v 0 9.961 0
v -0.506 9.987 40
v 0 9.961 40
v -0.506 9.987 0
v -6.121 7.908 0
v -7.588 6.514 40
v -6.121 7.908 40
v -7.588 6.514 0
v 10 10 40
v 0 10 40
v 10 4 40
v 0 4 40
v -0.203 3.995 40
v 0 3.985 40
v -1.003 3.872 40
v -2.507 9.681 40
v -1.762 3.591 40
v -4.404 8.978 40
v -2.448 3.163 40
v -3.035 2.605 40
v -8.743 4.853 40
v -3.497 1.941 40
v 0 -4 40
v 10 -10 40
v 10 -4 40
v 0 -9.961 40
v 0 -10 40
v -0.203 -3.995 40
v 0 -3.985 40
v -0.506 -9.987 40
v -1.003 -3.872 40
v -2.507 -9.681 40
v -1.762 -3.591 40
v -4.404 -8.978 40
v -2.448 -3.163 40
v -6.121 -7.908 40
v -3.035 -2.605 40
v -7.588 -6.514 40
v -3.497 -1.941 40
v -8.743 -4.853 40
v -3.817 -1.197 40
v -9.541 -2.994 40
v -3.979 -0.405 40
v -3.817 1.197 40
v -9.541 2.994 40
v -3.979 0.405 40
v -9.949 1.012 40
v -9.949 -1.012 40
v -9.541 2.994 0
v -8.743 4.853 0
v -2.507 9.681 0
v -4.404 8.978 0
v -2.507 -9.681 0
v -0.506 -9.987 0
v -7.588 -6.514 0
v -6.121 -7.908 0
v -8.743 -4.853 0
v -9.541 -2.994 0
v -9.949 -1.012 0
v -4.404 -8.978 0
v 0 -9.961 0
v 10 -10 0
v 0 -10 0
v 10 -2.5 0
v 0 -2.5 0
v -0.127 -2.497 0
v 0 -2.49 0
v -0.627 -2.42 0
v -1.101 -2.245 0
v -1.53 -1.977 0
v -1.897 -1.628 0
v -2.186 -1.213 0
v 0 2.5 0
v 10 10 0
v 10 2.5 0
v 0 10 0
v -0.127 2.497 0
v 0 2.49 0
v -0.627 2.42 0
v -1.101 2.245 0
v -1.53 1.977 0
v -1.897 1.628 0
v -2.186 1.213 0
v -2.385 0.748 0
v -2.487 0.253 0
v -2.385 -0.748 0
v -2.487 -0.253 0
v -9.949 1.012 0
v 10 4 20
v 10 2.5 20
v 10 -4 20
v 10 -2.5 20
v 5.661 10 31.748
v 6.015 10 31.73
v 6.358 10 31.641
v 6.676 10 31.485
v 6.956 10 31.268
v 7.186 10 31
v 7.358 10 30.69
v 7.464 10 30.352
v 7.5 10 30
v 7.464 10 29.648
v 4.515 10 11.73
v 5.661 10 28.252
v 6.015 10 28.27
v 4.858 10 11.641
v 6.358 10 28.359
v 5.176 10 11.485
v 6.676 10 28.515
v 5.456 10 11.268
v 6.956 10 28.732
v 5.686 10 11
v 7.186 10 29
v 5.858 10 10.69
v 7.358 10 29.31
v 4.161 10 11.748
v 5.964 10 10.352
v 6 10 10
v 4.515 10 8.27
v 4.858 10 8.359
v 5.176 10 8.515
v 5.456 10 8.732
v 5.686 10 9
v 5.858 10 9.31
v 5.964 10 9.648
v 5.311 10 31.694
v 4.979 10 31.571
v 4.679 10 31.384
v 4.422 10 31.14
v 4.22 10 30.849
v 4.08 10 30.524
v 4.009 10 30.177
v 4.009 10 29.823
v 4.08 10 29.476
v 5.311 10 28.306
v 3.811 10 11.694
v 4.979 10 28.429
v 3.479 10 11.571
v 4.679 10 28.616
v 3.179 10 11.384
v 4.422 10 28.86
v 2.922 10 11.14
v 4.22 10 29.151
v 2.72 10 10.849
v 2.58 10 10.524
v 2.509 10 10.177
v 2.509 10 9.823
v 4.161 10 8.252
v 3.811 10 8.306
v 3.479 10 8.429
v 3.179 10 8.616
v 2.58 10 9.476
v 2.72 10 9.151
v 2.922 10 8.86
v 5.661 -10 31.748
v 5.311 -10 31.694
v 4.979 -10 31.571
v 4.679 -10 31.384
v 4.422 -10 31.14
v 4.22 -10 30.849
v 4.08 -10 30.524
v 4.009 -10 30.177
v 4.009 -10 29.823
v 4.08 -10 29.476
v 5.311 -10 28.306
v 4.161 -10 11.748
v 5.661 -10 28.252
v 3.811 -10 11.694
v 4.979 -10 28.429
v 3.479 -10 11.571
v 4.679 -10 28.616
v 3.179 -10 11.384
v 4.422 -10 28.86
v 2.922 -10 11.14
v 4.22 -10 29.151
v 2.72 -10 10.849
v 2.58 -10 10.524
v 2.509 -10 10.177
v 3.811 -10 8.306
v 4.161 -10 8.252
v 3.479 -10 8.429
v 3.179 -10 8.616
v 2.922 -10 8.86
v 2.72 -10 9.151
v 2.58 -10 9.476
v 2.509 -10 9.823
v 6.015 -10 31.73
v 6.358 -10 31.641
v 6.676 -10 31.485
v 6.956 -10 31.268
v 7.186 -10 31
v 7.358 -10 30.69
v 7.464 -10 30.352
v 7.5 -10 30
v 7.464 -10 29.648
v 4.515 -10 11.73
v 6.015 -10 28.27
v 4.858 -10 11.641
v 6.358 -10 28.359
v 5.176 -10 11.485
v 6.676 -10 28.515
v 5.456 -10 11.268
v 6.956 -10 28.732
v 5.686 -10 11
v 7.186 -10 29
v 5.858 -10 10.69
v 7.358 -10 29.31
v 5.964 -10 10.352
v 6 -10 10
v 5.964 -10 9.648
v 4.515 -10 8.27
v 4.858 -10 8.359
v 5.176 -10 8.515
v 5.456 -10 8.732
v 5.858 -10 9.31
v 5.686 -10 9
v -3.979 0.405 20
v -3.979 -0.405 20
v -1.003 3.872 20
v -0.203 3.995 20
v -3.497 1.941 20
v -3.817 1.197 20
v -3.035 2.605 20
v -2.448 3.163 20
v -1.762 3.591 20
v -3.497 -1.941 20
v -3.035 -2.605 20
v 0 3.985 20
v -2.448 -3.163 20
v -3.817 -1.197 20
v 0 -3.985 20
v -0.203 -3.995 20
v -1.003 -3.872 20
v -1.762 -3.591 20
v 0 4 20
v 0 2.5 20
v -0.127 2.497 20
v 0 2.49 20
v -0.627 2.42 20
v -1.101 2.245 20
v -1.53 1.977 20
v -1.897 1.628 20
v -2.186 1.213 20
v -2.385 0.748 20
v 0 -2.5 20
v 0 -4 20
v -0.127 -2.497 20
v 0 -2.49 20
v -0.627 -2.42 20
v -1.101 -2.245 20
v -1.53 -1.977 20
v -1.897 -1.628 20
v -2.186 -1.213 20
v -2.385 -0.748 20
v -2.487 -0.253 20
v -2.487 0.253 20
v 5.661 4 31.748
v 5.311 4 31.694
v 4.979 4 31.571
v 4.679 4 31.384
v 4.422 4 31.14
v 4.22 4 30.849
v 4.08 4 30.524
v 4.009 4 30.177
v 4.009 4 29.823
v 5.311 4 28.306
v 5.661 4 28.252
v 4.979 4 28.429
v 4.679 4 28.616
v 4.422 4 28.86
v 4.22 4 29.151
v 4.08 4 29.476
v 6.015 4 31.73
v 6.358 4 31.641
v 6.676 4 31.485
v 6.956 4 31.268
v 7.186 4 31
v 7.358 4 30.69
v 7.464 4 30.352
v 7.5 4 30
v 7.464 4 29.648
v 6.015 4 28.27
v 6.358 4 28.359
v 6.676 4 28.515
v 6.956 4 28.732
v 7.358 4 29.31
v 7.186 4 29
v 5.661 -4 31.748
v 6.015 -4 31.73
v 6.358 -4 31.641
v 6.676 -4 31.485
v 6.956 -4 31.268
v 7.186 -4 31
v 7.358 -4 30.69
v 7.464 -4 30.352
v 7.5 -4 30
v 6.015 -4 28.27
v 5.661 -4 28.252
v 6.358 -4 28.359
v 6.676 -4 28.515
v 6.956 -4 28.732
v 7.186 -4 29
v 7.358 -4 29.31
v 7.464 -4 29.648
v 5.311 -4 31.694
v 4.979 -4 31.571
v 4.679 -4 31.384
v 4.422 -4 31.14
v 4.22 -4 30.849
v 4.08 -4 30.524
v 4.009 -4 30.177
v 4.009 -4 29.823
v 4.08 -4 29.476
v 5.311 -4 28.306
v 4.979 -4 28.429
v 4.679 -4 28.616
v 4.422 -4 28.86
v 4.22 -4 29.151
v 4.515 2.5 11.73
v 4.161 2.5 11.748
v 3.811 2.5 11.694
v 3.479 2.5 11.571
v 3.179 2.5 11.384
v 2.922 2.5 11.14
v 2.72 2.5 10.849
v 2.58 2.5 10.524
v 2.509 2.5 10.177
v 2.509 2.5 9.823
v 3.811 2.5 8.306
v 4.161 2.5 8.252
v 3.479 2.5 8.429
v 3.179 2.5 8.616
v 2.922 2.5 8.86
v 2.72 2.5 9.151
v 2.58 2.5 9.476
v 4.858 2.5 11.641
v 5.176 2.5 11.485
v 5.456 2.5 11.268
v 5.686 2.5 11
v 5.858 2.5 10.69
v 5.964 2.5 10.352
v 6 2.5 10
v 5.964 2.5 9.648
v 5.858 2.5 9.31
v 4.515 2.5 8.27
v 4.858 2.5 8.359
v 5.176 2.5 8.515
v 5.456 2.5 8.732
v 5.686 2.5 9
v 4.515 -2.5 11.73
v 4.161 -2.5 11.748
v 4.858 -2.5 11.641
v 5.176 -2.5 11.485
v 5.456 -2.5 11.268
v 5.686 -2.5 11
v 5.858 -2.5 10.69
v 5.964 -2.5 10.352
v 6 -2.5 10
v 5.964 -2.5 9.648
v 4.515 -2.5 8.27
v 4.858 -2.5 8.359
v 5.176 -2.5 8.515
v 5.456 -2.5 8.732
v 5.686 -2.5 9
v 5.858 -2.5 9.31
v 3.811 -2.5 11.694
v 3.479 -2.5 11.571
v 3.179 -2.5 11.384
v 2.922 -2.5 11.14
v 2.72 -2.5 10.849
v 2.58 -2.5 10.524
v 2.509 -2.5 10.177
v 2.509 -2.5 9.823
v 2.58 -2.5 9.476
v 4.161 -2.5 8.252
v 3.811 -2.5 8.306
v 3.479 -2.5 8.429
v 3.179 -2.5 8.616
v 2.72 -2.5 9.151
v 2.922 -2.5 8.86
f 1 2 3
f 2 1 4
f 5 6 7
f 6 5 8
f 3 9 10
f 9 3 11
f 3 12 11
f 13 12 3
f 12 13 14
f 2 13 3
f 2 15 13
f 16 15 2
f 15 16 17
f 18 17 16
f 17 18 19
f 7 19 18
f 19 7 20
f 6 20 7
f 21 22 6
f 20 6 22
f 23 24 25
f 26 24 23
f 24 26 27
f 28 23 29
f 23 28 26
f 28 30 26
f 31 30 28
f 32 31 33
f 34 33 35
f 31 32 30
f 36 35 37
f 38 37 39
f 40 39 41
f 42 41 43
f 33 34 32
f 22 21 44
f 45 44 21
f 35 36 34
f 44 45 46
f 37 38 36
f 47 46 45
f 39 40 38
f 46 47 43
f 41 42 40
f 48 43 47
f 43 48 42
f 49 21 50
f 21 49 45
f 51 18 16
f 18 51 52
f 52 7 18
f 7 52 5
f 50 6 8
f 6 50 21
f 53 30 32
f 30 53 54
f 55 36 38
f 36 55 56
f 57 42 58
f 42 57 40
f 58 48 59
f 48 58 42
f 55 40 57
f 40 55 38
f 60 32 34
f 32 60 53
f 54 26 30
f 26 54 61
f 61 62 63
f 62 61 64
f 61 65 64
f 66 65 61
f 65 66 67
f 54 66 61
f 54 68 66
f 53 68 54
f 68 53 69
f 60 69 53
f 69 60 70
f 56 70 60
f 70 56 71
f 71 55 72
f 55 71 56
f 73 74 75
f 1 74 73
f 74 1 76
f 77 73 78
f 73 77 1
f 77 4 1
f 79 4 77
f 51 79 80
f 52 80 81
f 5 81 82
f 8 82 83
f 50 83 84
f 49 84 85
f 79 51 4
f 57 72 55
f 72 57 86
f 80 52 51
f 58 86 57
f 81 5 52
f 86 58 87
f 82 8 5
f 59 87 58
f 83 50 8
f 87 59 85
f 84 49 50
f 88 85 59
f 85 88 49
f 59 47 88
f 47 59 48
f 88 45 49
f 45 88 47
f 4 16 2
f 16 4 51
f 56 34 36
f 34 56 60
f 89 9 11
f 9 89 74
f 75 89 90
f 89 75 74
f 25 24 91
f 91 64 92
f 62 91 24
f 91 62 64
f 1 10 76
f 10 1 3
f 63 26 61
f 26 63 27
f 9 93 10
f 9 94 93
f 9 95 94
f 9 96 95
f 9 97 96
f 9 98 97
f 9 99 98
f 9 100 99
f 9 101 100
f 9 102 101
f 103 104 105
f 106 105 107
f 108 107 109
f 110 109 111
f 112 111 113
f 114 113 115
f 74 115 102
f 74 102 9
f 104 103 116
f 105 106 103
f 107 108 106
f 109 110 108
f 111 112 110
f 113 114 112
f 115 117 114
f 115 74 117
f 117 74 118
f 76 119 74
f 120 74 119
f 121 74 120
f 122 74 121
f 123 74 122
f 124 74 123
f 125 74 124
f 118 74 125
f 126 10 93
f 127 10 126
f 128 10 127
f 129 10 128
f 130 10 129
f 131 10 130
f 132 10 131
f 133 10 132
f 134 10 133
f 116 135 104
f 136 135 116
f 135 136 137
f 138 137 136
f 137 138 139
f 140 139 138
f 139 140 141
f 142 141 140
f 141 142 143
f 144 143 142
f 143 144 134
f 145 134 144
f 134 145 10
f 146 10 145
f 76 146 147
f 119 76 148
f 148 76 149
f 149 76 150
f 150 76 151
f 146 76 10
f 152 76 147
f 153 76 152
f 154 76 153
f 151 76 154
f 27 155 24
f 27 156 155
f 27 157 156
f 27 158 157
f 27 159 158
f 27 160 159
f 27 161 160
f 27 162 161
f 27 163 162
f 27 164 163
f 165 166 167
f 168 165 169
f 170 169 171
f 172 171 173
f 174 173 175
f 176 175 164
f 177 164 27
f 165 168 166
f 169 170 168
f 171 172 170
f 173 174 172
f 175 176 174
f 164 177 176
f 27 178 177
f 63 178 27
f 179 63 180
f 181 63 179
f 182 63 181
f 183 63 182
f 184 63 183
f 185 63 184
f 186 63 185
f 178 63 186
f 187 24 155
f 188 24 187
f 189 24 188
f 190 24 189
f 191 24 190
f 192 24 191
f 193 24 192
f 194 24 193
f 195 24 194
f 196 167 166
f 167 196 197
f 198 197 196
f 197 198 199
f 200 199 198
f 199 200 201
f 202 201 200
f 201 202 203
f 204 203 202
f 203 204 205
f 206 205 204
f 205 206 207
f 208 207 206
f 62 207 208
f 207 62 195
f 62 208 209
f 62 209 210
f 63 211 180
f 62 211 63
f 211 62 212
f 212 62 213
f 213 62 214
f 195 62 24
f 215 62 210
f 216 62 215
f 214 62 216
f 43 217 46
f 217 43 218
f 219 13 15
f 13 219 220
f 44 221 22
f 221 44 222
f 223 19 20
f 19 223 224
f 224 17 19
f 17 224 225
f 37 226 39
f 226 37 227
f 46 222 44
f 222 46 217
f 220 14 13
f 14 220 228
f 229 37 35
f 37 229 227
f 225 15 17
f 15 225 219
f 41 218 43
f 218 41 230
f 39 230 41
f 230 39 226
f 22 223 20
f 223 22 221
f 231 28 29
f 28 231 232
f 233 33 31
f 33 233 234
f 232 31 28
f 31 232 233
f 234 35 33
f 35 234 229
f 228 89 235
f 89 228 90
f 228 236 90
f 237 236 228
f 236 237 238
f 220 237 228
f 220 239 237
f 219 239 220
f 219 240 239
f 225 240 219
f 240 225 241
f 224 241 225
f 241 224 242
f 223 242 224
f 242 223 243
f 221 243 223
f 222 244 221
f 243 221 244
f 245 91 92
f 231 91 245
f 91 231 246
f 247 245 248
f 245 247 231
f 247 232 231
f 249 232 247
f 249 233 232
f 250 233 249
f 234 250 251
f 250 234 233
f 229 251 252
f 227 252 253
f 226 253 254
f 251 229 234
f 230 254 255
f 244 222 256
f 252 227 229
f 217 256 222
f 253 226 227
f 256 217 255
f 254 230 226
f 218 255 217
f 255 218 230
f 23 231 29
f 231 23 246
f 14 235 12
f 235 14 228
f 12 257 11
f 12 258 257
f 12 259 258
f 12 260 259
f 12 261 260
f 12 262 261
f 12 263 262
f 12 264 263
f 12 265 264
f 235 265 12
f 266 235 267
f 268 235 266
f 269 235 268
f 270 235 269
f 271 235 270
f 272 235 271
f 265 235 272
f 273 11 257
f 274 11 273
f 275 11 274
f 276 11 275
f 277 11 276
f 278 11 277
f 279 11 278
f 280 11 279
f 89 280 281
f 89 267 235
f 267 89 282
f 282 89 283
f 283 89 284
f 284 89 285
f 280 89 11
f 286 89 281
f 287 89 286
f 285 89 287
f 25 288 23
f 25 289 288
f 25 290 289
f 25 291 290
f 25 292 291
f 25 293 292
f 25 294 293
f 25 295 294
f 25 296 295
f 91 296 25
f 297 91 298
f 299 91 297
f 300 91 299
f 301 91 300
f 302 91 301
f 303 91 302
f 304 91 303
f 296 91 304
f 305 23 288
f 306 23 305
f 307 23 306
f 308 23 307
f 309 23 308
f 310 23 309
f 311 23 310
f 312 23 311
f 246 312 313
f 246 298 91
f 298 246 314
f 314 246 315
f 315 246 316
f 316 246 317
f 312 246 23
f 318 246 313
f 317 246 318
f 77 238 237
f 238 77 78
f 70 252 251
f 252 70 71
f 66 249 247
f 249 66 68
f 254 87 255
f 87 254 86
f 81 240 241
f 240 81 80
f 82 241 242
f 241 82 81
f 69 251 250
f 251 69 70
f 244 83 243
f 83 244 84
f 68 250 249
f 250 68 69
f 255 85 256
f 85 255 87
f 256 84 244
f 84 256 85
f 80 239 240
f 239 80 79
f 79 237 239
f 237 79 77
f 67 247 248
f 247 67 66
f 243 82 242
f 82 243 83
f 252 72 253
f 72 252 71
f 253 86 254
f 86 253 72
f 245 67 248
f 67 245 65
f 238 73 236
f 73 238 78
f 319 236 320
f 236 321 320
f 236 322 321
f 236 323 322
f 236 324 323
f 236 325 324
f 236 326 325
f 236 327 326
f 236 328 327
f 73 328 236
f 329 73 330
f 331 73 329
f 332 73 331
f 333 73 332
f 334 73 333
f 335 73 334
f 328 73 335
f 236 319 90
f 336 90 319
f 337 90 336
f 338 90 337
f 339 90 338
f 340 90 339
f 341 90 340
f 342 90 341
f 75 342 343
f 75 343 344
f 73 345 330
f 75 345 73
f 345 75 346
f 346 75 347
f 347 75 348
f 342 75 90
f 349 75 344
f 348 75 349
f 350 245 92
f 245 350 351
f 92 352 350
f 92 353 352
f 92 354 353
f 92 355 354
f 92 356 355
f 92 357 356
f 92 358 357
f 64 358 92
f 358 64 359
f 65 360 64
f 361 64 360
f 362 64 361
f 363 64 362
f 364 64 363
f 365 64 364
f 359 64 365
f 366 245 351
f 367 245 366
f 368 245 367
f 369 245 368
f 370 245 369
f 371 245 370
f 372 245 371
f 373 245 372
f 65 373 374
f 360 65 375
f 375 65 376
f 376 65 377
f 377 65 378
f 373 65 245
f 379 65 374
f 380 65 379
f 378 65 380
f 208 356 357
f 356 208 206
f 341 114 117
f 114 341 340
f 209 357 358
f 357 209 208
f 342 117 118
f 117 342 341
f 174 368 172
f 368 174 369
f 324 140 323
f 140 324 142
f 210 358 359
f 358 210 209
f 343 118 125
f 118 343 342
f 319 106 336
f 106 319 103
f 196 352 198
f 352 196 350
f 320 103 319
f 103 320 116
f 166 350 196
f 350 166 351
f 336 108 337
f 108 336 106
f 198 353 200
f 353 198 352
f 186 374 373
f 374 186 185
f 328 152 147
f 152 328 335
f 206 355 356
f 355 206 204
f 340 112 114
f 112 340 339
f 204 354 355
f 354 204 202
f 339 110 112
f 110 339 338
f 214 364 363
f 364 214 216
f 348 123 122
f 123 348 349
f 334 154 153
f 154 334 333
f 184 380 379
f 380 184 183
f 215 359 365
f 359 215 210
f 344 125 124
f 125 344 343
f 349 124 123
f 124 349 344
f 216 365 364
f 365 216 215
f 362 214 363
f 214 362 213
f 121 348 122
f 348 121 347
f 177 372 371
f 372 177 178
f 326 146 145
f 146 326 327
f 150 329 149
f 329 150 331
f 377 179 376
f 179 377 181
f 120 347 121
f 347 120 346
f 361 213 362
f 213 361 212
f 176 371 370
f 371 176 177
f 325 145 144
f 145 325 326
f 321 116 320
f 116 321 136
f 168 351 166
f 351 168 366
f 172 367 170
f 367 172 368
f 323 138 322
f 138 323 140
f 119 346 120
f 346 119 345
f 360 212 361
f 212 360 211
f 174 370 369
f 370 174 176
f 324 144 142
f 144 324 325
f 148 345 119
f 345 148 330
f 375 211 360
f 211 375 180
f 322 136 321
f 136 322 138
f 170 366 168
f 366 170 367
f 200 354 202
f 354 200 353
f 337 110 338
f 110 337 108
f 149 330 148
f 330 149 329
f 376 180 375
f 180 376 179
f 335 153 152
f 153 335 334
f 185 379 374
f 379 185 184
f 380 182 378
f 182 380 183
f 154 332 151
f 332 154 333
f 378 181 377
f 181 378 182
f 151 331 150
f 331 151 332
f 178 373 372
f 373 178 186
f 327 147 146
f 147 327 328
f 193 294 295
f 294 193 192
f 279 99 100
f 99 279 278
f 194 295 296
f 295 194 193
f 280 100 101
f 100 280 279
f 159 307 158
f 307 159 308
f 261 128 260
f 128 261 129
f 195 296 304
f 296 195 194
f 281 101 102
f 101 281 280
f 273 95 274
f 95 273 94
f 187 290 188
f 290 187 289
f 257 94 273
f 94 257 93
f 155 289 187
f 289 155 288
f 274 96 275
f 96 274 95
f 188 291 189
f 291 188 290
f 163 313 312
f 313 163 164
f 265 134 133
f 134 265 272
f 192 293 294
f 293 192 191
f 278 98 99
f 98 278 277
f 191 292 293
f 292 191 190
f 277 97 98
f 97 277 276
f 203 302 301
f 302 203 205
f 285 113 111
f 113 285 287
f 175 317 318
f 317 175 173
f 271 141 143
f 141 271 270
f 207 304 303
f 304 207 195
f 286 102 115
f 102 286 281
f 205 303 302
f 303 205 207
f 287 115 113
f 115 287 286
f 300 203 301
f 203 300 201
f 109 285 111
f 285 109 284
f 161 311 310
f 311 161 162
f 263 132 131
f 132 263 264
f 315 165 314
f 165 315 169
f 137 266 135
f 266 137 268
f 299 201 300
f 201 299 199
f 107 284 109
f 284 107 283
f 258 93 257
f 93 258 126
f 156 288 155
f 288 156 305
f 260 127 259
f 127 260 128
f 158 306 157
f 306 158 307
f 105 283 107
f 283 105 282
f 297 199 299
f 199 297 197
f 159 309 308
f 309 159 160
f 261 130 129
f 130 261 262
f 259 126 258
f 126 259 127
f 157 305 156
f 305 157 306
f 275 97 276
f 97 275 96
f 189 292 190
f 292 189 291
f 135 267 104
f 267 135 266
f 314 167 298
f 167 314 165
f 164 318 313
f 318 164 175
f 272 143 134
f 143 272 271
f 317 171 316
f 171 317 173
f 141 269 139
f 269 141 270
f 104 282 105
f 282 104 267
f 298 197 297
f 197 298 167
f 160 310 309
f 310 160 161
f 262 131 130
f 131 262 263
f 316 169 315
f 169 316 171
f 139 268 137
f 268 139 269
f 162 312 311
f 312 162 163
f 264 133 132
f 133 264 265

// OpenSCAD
// file: config.scad
// https://docs.google.com/viewer?a=v&pid=explorer&chrome=true&srcid=0B8AGtzEPL1XpNGIwMjM0NzQtZmMyMS00YmU2LTkwMjItNTkzNzA0MDJkZTAx&hl=en_US&authkey=CMjZjW0

$fn = 31;

//Delta config constants
upperlinkage = 63; 
lowerlinkage = 126;
baseradius = 45;
endeffector = 50; //radius of the end effector
fourbarspacing = 70;

//hardware
screwdia = 3.5; //m3
screwheaddia = 5.6; //m3
screwheadheight = 3.2; //m3
nutapothem = 5.7; //m3
nutheight = 2.5; //m3 lock nut

//motors 
holespacing = 17*2.54*sin(45); //nema 17
shaftlength = 22;
shaftdia = 5;
bodylength = 48;
bodywidth = 42; //could also be diameter of a round servo
motorwall = 2.75;
motorcenterdia = 25;

//Structure pieces
structbase = 110;  //180
structheight = 40;  //70
structholes = 3; //how many holes are on each side. 
structthickness = 2;
structbracewidth = 9;

//z axis plates
smoothroddia = 8;
platelength = 110;
platethickness = 3;

//cups
cupwall = 2.7;

//end effector
extruderspacing = 40;
extrudermountholes = 10;

//base
basemotorwall = 2.7;

//upper linkage
upperlinkthick = nutapothem/cos(30);
upperlinkwidth = 20;

//coupling
leadscrewdia = 8;
couplingwall = 6;
couplingheight = 40;

//general shit
nutwall = nutapothem/4;
// main file
/*
  Deltafab - A Fully Parametric and Printable RepRap
    Copyright (C) 2011  Steve Kelly

    This program is free software: you can redistribute it and/or modify
    it under the terms of the GNU General Public License as published by
    the Free Software Foundation, either version 3 of the License, or
    (at your option) any later version.

    This program is distributed in the hope that it will be useful,
    but WITHOUT ANY WARRANTY; without even the implied warranty of
    MERCHANTABILITY or FITNESS FOR A PARTICULAR PURPOSE.  See the
    GNU General Public License for more details.

    You should have received a copy of the GNU General Public License
    along with this program.  If not, see <http://www.gnu.org/licenses/>.
*/

include <config.scad>;
	//Breakout and distributed vars

module coupling(){
	difference(){
		union(){
			cylinder( r=leadscrewdia/2+couplingwall, h = couplingheight);
			translate([0,-leadscrewdia/2-couplingwall,0])cube([leadscrewdia/2+couplingwall,leadscrewdia+couplingwall*2,couplingheight]);
		}
		translate([0,0,couplingheight/2])cylinder( r=leadscrewdia/2, h = couplingheight/2+1);
		translate([0,-leadscrewdia/2,couplingheight/2])cube([leadscrewdia/2+couplingwall+1,leadscrewdia,couplingheight/2+1]);
		translate([0,0,-1])cylinder( r=shaftdia/2, h = couplingheight/2+2);
		translate([0,-shaftdia/2,-1])cube([leadscrewdia/2+couplingwall+1,shaftdia,couplingheight/2+2]);
		translate([shaftdia/2+screwdia/2,leadscrewdia/2+couplingwall+1,couplingheight/4])rotate([90,0,0])cylinder(r=screwdia/2, h=leadscrewdia+couplingwall*2+2);
		translate([leadscrewdia/2+screwdia/2,leadscrewdia/2+couplingwall+1,couplingheight*0.75])rotate([90,0,0])cylinder(r=screwdia/2, h=leadscrewdia+couplingwall*2+2);
	}
}

coupling();
